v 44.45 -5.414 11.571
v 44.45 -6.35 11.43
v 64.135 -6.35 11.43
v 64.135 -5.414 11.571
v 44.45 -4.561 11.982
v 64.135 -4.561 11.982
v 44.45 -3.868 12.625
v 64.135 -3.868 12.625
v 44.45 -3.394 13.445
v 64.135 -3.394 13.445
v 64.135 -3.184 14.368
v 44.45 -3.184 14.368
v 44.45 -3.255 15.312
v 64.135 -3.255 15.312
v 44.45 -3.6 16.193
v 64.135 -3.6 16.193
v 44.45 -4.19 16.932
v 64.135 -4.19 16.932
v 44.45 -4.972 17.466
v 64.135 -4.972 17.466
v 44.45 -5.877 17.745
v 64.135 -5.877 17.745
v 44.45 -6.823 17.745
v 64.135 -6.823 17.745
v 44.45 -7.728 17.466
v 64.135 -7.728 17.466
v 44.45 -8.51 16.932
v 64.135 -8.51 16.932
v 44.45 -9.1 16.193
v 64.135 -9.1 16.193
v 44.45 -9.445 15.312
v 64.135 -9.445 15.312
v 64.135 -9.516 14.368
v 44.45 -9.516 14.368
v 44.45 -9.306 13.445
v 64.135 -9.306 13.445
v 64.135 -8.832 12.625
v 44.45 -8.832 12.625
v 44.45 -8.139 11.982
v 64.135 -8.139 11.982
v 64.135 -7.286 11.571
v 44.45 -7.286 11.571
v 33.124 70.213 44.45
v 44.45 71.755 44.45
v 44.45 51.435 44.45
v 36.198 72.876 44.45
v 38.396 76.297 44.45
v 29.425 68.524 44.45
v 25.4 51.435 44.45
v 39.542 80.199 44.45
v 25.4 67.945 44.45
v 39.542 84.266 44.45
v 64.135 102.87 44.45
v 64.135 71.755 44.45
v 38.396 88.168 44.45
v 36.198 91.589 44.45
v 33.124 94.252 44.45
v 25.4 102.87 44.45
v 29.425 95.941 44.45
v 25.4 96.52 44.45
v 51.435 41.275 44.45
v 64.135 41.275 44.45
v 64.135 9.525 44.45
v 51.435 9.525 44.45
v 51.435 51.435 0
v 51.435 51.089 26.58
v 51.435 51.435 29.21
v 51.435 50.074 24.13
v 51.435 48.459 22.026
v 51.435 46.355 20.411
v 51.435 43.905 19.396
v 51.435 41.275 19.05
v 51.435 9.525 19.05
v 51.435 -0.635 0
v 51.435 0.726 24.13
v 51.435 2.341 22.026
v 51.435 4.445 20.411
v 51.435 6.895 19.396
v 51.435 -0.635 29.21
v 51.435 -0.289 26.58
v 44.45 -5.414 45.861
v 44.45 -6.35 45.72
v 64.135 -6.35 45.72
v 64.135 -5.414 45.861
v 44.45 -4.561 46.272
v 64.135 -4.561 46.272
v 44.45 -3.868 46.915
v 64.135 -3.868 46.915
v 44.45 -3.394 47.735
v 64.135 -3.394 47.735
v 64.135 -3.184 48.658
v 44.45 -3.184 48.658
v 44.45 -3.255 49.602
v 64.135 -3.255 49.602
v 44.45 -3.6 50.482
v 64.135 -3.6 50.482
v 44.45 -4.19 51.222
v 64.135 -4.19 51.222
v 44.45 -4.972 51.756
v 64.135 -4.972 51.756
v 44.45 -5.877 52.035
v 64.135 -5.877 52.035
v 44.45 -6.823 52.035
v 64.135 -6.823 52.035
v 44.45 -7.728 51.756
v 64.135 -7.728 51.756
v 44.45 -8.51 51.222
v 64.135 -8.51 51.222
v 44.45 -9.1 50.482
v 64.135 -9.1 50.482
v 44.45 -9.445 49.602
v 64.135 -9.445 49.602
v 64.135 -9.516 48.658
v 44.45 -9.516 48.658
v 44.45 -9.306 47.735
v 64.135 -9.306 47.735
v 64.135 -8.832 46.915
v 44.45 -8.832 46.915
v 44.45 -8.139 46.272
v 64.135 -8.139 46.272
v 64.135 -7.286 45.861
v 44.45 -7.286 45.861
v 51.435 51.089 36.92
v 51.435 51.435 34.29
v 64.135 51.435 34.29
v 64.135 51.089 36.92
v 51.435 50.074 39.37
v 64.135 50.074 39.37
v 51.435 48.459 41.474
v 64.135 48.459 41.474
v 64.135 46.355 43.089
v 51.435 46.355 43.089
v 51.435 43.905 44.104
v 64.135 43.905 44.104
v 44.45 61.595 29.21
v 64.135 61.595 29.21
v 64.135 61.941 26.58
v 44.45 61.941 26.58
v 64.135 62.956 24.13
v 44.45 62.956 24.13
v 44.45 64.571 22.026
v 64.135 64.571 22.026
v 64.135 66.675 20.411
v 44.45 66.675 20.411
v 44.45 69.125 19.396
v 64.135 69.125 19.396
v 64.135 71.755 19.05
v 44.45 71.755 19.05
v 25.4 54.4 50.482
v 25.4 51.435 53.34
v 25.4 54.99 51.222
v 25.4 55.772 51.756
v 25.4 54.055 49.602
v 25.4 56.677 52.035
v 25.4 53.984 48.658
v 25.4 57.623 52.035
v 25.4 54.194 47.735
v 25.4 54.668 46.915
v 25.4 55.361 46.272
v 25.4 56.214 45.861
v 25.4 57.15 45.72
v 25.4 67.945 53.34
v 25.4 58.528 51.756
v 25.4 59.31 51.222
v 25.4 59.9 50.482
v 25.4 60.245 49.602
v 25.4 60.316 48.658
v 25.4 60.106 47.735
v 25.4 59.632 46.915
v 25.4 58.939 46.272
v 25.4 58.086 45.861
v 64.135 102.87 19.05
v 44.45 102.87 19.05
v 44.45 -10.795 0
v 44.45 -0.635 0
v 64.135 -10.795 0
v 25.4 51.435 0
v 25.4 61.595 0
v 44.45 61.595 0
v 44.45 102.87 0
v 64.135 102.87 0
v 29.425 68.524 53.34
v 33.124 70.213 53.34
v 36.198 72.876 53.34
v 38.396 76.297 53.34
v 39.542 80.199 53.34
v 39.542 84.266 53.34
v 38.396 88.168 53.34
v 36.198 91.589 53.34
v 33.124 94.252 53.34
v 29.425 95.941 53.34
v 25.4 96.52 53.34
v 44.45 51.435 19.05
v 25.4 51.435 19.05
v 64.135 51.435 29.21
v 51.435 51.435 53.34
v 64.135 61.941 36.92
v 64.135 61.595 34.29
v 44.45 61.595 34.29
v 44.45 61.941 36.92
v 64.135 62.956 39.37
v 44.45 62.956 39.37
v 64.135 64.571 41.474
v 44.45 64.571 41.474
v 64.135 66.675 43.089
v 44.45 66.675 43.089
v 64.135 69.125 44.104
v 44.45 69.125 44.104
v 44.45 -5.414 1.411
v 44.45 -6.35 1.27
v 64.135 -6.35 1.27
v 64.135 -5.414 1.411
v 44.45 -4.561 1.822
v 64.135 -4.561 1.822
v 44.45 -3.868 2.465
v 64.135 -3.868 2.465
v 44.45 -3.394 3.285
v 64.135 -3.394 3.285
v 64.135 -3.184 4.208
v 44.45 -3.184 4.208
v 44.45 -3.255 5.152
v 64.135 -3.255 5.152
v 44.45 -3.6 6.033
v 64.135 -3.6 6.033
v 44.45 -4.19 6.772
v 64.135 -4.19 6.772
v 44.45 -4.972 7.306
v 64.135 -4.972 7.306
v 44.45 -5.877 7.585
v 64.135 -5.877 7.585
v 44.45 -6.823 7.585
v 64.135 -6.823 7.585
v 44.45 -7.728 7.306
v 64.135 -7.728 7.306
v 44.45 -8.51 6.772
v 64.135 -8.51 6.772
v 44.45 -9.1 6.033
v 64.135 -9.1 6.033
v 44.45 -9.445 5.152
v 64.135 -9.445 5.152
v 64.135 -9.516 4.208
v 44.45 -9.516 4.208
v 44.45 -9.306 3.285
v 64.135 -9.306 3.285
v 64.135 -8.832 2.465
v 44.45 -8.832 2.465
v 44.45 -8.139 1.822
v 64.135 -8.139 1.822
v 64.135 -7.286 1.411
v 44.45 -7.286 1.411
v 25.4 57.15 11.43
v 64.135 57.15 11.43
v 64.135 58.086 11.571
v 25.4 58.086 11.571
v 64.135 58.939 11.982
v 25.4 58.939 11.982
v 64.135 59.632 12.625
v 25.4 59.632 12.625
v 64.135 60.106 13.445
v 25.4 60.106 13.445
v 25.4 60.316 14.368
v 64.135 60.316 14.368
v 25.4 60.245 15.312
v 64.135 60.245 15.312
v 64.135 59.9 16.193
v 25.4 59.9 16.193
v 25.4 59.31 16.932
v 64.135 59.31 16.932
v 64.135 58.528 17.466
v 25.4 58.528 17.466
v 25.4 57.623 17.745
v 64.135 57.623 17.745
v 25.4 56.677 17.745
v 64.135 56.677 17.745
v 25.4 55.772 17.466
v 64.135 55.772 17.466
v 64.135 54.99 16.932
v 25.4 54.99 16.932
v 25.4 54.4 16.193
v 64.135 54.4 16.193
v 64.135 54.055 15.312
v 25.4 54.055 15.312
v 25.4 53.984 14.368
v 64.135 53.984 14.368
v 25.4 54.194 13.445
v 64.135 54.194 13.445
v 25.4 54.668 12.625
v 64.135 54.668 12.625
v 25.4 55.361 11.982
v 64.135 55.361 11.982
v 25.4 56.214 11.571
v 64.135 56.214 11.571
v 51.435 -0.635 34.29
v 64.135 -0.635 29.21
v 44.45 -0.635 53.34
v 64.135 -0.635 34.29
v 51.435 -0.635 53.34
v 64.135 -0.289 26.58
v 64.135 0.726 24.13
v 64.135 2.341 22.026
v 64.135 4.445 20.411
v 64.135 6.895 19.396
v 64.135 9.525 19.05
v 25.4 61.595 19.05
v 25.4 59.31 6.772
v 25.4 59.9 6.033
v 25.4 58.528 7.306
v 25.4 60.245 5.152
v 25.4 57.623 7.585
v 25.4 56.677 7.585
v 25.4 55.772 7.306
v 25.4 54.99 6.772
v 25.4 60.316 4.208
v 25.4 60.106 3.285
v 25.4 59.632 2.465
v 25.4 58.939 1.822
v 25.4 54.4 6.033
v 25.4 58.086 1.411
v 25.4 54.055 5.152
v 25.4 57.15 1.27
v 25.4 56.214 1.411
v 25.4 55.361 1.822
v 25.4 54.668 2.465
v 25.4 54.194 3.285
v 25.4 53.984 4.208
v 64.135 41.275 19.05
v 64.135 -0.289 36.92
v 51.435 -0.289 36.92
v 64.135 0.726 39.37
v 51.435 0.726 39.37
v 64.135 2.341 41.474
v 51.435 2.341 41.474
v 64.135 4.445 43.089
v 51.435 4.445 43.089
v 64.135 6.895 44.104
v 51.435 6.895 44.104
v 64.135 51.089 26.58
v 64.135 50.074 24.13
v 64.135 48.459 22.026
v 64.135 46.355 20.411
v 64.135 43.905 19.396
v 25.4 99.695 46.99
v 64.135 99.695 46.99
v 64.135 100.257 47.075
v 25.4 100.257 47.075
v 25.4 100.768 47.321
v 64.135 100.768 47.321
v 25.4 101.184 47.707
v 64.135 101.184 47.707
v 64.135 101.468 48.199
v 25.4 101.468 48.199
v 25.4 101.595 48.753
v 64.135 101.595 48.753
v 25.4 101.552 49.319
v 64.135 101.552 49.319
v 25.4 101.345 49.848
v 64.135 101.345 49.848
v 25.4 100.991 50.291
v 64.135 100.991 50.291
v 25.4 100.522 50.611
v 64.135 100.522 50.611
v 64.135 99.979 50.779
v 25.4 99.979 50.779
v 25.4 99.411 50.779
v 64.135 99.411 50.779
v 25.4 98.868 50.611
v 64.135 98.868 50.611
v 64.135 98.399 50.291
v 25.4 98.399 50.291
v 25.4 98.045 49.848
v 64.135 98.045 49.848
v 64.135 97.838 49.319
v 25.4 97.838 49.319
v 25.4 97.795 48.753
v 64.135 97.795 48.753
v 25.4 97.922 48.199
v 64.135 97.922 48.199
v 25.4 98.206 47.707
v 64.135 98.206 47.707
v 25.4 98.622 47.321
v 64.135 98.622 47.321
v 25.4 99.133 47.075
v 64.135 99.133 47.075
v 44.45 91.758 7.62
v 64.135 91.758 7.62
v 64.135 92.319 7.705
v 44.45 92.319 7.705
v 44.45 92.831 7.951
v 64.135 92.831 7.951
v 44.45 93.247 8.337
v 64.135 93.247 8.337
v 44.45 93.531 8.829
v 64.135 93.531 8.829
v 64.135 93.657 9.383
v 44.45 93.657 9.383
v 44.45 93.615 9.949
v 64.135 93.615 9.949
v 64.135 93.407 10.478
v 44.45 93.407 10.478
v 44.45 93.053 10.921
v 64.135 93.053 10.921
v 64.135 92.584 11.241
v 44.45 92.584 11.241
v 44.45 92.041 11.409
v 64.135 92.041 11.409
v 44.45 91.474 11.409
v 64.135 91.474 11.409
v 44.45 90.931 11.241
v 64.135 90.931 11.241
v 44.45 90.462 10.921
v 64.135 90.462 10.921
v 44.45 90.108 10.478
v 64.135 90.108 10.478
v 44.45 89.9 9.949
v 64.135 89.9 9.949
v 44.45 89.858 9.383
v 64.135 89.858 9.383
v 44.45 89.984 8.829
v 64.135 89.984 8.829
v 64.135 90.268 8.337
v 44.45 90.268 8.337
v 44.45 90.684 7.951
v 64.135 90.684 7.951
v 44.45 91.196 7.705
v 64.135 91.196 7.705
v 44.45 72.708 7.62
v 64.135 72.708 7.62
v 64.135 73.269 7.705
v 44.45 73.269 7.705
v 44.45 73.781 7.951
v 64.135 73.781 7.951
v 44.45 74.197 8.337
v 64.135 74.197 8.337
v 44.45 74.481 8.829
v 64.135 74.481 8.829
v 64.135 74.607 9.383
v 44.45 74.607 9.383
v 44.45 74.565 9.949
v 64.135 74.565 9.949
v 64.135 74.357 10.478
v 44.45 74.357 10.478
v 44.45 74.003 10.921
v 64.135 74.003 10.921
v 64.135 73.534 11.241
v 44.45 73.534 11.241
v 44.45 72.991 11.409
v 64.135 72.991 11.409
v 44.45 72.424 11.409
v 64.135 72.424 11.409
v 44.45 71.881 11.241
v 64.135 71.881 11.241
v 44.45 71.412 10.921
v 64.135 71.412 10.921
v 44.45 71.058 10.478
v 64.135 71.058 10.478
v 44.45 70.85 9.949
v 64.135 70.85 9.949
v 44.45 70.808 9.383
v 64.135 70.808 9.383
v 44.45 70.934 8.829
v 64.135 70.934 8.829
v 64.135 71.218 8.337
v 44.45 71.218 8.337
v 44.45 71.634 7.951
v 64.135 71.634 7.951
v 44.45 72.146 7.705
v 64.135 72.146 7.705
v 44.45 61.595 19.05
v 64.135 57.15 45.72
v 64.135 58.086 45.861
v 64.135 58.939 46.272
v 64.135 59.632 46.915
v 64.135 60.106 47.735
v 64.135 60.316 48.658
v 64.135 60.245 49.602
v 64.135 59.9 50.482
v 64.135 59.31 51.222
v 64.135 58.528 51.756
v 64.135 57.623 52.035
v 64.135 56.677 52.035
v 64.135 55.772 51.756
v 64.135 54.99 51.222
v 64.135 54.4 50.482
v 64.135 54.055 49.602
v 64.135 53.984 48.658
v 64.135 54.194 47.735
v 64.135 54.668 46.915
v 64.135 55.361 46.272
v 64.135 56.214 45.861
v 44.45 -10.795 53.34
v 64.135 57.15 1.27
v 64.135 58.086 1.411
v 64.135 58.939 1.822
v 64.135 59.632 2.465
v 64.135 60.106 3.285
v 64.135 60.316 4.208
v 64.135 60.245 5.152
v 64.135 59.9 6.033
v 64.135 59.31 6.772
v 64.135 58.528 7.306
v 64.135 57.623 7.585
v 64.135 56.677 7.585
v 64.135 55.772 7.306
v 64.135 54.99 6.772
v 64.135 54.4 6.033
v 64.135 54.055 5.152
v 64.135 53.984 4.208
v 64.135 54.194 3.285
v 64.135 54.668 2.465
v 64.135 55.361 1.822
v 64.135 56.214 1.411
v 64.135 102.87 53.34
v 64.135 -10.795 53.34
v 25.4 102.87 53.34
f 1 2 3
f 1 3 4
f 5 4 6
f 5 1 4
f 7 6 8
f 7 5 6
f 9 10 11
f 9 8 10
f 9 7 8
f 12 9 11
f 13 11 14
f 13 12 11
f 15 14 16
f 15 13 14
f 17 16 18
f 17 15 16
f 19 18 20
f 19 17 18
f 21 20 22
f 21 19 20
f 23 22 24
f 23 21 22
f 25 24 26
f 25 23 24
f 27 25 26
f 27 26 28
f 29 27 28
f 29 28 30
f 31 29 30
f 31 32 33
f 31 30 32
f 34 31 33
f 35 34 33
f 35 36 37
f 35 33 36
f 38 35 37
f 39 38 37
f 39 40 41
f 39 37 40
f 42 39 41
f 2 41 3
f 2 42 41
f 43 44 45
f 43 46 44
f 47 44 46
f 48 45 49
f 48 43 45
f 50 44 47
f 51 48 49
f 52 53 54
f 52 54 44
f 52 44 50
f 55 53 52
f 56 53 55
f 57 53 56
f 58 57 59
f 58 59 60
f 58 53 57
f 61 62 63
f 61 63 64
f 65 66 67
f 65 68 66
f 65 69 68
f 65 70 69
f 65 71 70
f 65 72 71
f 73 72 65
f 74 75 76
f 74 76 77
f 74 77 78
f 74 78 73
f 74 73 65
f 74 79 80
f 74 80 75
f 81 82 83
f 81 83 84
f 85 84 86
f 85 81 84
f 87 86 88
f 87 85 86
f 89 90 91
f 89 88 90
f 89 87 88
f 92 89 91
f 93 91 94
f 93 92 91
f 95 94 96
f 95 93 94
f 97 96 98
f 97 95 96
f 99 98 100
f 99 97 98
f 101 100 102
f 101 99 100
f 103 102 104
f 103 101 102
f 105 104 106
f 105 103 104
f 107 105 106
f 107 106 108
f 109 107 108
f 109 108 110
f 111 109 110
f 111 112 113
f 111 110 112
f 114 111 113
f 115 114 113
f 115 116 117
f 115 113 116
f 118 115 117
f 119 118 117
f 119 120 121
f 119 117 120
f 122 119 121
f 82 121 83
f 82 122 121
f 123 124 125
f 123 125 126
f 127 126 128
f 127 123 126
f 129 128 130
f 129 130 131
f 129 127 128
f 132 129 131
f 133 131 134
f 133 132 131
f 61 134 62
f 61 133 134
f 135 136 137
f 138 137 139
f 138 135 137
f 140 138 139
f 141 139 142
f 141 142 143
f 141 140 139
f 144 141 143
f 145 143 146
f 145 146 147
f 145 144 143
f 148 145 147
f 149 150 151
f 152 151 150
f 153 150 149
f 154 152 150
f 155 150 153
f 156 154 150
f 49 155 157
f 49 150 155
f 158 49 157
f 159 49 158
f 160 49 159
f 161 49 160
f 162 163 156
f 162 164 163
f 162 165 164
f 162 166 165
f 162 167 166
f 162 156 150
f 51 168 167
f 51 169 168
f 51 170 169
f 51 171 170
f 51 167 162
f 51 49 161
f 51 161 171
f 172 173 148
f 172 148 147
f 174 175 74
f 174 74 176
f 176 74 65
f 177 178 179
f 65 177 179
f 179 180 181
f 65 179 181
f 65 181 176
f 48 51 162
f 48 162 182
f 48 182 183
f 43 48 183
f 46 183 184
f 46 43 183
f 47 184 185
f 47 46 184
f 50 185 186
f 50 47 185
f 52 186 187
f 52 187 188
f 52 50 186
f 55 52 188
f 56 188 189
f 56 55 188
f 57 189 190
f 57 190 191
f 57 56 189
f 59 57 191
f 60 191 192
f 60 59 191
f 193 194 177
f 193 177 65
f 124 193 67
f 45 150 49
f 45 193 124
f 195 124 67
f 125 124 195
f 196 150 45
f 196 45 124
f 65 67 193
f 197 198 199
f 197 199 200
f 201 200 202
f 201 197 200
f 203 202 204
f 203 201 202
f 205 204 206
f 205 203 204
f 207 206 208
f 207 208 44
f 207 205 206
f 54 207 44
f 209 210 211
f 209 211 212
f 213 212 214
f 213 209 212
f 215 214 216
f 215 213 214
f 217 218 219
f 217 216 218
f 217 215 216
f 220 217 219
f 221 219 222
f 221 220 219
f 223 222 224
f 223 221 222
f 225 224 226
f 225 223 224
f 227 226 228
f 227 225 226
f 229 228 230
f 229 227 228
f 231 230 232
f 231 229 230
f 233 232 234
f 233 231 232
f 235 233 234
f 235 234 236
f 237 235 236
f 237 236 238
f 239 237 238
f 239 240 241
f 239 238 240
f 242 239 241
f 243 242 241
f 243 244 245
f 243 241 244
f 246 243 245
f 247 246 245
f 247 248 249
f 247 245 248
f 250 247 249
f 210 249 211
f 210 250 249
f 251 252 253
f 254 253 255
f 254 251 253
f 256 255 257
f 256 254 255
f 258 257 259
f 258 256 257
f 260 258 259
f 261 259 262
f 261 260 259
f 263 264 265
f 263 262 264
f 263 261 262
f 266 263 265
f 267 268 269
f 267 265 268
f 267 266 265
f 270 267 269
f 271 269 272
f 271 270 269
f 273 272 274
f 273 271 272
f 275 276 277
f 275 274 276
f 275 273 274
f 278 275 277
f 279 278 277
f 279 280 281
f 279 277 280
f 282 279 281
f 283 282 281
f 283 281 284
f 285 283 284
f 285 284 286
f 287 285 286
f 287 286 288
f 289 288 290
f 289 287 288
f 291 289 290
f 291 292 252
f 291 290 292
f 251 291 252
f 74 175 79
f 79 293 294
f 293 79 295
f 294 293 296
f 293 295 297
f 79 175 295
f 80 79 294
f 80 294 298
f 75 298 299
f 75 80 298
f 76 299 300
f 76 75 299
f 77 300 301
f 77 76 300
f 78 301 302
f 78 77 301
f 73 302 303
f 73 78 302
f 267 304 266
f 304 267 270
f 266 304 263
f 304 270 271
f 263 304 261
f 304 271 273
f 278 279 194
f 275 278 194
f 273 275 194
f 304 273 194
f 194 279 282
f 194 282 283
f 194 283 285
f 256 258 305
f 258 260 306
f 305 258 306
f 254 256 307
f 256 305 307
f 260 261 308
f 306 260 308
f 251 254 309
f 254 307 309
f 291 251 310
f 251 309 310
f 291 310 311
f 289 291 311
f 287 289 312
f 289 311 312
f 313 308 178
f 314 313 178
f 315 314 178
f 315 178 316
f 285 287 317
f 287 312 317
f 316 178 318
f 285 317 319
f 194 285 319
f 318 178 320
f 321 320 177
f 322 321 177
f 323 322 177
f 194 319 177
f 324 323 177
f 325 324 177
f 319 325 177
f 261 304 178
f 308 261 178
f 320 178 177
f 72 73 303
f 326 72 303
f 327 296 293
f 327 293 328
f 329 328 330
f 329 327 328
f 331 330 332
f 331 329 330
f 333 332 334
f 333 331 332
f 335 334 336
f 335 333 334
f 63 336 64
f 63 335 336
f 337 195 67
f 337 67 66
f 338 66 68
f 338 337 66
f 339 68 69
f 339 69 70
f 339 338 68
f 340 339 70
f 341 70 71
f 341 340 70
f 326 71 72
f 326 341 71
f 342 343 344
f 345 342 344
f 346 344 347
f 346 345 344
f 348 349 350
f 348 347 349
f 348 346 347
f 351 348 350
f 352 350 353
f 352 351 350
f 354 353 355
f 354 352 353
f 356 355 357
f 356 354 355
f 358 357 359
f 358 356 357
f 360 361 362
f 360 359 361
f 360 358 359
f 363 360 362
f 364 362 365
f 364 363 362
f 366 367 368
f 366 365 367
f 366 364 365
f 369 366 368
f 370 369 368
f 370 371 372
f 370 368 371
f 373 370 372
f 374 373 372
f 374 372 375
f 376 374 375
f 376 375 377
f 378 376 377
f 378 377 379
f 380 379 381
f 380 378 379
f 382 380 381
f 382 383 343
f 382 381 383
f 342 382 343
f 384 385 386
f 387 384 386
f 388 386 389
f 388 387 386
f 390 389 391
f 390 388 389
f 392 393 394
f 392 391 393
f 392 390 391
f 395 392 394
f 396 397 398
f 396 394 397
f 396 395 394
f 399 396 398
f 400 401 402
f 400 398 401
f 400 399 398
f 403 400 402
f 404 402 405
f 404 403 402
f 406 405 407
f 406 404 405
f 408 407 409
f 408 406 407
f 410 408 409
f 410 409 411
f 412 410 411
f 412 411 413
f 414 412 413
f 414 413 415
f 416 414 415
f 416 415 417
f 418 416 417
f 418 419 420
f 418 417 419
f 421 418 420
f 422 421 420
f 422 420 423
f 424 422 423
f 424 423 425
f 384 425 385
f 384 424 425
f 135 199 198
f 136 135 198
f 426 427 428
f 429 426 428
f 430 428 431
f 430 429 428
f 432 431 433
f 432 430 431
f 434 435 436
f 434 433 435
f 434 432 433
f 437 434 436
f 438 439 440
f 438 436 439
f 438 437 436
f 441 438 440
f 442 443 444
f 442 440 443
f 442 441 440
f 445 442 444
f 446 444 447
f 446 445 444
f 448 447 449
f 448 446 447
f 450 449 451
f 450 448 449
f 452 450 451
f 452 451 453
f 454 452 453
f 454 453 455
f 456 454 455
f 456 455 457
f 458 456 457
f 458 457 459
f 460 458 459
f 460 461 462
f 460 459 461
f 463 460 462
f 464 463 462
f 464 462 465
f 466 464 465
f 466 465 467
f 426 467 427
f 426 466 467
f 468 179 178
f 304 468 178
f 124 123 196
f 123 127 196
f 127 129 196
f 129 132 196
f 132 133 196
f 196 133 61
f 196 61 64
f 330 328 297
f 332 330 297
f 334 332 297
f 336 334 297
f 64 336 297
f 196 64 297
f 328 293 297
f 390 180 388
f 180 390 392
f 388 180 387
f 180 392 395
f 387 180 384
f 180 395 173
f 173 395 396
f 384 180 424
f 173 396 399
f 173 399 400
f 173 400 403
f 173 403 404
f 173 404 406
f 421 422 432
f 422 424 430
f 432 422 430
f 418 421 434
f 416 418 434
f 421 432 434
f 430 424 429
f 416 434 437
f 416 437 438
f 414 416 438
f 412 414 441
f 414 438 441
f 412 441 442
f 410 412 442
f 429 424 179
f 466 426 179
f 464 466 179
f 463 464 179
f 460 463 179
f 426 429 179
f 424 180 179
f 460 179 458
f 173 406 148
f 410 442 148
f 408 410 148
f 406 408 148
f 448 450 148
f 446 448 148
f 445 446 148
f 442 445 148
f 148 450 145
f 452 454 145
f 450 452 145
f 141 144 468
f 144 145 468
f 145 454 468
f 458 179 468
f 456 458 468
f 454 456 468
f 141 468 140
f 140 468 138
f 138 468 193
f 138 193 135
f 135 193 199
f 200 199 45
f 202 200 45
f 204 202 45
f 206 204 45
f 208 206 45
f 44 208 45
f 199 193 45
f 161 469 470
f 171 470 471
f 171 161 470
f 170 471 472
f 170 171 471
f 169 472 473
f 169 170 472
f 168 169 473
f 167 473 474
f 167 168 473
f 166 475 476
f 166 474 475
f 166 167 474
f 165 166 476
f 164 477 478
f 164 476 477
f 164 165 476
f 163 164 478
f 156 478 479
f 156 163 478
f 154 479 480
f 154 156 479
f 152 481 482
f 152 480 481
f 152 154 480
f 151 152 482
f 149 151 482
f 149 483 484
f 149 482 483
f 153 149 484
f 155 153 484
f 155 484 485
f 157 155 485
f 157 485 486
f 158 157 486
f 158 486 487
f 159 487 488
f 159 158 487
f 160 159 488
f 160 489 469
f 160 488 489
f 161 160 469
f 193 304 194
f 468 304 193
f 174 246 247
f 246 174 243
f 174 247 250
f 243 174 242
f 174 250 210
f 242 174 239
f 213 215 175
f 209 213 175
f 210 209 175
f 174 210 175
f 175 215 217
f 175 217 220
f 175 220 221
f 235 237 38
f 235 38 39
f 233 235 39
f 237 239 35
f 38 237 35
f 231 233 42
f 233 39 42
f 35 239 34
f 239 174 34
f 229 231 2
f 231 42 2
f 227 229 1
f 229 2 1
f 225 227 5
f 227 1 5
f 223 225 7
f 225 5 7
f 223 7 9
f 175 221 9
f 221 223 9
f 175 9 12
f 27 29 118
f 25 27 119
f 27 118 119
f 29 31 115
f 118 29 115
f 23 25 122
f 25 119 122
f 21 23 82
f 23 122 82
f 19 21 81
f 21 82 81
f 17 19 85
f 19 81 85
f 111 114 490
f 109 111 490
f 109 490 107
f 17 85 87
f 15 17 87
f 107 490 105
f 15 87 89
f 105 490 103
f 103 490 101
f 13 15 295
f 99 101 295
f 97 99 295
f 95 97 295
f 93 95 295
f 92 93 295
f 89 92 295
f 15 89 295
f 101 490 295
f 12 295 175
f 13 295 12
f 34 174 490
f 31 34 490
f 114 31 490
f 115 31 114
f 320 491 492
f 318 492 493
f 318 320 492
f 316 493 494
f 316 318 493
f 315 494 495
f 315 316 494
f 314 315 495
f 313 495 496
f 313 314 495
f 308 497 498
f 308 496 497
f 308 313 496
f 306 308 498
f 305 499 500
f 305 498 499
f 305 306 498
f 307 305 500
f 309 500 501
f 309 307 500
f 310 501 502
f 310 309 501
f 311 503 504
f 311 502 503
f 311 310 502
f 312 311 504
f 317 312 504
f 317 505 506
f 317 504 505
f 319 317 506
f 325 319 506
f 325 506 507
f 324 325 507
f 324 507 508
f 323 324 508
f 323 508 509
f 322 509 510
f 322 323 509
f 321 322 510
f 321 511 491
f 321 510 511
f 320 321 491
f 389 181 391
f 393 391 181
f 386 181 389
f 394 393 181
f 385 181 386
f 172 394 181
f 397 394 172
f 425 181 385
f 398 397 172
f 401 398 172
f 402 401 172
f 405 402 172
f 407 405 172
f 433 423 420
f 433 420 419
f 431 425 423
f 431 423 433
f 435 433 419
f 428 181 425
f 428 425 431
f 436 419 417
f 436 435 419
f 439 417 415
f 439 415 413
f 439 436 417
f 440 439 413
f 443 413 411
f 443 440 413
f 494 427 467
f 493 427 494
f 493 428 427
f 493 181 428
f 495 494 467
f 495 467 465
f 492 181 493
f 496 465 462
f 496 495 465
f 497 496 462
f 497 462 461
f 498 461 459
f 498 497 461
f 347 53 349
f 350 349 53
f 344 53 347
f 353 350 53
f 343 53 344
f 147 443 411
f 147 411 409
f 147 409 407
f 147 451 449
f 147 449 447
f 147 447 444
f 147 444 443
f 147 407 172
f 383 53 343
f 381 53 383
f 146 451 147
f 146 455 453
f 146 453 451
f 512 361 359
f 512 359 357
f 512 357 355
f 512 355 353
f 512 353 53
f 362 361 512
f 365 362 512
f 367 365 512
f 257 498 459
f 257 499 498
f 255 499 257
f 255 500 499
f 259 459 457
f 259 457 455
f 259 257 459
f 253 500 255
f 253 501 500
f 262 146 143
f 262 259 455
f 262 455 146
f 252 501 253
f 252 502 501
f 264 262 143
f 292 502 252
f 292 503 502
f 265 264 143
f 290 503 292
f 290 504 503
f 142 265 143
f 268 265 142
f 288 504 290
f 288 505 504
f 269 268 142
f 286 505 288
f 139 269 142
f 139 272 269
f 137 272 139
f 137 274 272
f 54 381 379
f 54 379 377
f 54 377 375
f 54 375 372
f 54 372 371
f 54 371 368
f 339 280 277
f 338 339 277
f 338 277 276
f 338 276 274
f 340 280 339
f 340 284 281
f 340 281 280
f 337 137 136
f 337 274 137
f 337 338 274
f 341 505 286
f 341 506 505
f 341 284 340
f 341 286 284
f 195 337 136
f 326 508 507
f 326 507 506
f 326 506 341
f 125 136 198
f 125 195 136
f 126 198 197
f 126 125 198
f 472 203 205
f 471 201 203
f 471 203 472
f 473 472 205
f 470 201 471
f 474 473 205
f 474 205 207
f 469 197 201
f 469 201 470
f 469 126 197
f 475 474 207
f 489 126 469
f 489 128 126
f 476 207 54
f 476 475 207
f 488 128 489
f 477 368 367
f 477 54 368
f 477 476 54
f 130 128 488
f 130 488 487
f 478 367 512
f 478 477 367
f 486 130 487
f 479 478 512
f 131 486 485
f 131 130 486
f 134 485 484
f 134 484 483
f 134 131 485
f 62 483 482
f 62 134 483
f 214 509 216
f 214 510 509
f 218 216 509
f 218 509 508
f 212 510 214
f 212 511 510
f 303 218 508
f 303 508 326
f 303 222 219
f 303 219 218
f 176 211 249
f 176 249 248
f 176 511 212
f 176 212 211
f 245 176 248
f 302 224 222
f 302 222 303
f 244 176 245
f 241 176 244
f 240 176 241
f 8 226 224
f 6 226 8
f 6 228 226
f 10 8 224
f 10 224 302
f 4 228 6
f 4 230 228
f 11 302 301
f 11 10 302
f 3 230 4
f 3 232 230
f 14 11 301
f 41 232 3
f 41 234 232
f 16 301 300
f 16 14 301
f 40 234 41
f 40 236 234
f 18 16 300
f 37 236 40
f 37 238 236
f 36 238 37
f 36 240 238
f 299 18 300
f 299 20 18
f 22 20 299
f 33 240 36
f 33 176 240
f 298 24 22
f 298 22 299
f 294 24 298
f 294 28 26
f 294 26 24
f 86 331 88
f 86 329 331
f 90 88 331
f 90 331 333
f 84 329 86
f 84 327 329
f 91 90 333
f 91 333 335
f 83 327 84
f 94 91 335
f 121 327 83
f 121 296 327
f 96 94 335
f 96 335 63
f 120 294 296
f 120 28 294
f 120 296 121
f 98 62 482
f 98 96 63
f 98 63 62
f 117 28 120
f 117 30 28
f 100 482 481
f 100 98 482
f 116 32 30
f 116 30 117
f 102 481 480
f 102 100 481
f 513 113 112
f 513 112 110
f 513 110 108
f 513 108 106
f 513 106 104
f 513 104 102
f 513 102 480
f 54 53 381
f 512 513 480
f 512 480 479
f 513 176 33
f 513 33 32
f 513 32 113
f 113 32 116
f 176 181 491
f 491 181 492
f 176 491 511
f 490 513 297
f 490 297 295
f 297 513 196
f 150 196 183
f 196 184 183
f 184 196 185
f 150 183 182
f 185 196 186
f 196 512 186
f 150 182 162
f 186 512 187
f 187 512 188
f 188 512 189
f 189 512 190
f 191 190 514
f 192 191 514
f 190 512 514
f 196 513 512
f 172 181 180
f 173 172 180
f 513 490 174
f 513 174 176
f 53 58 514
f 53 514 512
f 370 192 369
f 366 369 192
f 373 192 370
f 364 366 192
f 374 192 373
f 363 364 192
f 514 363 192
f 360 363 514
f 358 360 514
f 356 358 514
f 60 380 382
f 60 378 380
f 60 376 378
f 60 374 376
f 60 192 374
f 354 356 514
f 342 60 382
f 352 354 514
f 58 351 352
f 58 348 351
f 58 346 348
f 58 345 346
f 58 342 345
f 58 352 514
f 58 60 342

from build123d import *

# Parameters (mm, degrees)
BOSS_EXTRUDE1_DEPTH     = 19.05
CUT_EXTRUDE1_DEPTH      = 112.559578813
CUT_EXTRUDE1_DEPTH_BACK = 112.559578813
SKETCH2_R               = 1.905
BOSS_EXTRUDE2_START     = 25.4
BOSS_EXTRUDE2_DEPTH     = 8.89
SKETCH5_W               = 19.685
SKETCH5_H               = 10.16
BOSS_EXTRUDE4_DEPTH     = 34.29
CUT_EXTRUDE2_DEPTH      = 123.179346557
CUT_EXTRUDE2_DEPTH_BACK = 123.179346557
SKETCH6_R               = 3.175
CUT_EXTRUDE4_DEPTH      = 123.179346557
CUT_EXTRUDE4_DEPTH_BACK = 123.179346557
SKETCH9_R               = 3.175
FILLET1_R               = 10.16
CUT_EXTRUDE8_DEPTH      = 123.179346557
CUT_EXTRUDE8_DEPTH_BACK = 123.179346557
SKETCH14_R              = 1.905


with BuildPart() as part:
    # Sketch1 → Boss-Extrude1 (new body)
    with BuildSketch(Plane.XY):
        Polygon((44.45, -0.635), (44.45, -10.795), (64.135, -10.795), (64.135, 102.87), (44.45, 102.87), (44.45, 100.33), (44.45, 61.595), (25.4, 61.595), (25.4, 51.435), (51.435, 51.435), (51.435, -0.635), align=None)
    extrude(amount=BOSS_EXTRUDE1_DEPTH)

    # Sketch2 → Cut-Extrude1 (cut, two sides: drawn at the far end of the back side and taken through both)
    with BuildSketch(Plane(origin=(64.135, 0, 0), x_dir=(0, 0, -1), z_dir=(1, 0, 0)).offset(-CUT_EXTRUDE1_DEPTH_BACK)):
        with Locations((-9.525, 91.7575)):
            Circle(SKETCH2_R)
        with Locations((-9.525, 72.7075)):
            Circle(SKETCH2_R)
    extrude(amount=CUT_EXTRUDE1_DEPTH + CUT_EXTRUDE1_DEPTH_BACK, mode=Mode.SUBTRACT)



with BuildPart() as body_2:
    # Sketch3 → Boss-Extrude2 (new body)
    with BuildSketch(Plane.XY.offset(19.05).offset(BOSS_EXTRUDE2_START)):
        with BuildLine():
            Line((25.4, 96.52), (25.4, 102.87))
            Line((25.4, 102.87), (44.45, 102.87))
            Line((44.45, 102.87), (64.135, 102.87))
            Line((64.135, 102.87), (64.135, -10.795))
            Line((64.135, -10.795), (44.45, -10.795))
            Line((44.45, -10.795), (44.45, -0.635))
            Line((44.45, -0.635), (51.435, -0.635))
            Line((51.435, -0.635), (51.435, 51.435))
            Line((51.435, 51.435), (25.4, 51.435))
            Line((25.4, 51.435), (25.4, 61.595))
            Line((25.4, 61.595), (25.4, 67.945))
            ThreePointArc((25.4, 67.945), (39.6875, 82.2325), (25.4, 96.52))
        make_face()
    extrude(amount=BOSS_EXTRUDE2_DEPTH)


with BuildPart() as part_1:
    add(part.part)

    add(body_2.part)  # Boss-Extrude4 merges body 2
    # Sketch5 → Boss-Extrude4 (add)
    with BuildSketch(Plane.XY.offset(53.34)):
        with Locations((54.2925, -5.715)):
            Rectangle(SKETCH5_W, SKETCH5_H)
        with Locations((54.2925, 56.515)):
            Rectangle(SKETCH5_W, SKETCH5_H)
    extrude(amount=-BOSS_EXTRUDE4_DEPTH)

    # Sketch6 → Cut-Extrude2 (cut, two sides: drawn at the far end of the back side and taken through both)
    with BuildSketch(Plane(origin=(64.135, 0, 0), x_dir=(0, 0, -1), z_dir=(1, 0, 0)).offset(-CUT_EXTRUDE2_DEPTH_BACK)):
        with Locations((-14.605, 57.15)):
            Circle(SKETCH6_R)
        with Locations((-4.445, 57.15)):
            Circle(SKETCH6_R)
        with Locations((-14.605, -6.35)):
            Circle(SKETCH6_R)
        with Locations((-4.445, -6.35)):
            Circle(SKETCH6_R)
    extrude(amount=CUT_EXTRUDE2_DEPTH + CUT_EXTRUDE2_DEPTH_BACK, mode=Mode.SUBTRACT)

    # Sketch9 → Cut-Extrude4 (cut, two sides: drawn at the far end of the back side and taken through both)
    with BuildSketch(Plane(origin=(64.135, 0, 0), x_dir=(0, 0, -1), z_dir=(1, 0, 0)).offset(-CUT_EXTRUDE4_DEPTH_BACK)):
        with Locations((-48.895, 57.15)):
            Circle(SKETCH9_R)
        with Locations((-48.895, -6.35)):
            Circle(SKETCH9_R)
    extrude(amount=CUT_EXTRUDE4_DEPTH + CUT_EXTRUDE4_DEPTH_BACK, mode=Mode.SUBTRACT)

    # Fillet1
    # the kernel refuses this fillet: 10.16 mm, written as the material it adds along each edge
    with BuildSketch(Plane(origin=(44.45, 61.595, 19.05), x_dir=(0, 1, 0), z_dir=(1, 0, 0))) as fillet1_piece_1:
        with BuildLine():
            CenterArc((FILLET1_R, FILLET1_R), FILLET1_R, 180, 90)
            Line((0, FILLET1_R), (0, 0))
            Line((0, 0), (FILLET1_R, 0))
        make_face()
    extrude(amount=19.685)
    with BuildSketch(Plane(origin=(64.135, 51.435, 19.05), x_dir=(0, -1, 0), z_dir=(-1, 0, 0)), Plane(origin=(51.435, 51.435, 44.45), x_dir=(0, -1, 0), z_dir=(1, 0, 0))) as fillet1_piece_2:
        with BuildLine():
            CenterArc((FILLET1_R, FILLET1_R), FILLET1_R, 180, 90)
            Line((0, FILLET1_R), (0, 0))
            Line((0, 0), (FILLET1_R, 0))
        make_face()
    extrude(amount=12.7)
    with BuildSketch(Plane(origin=(64.135, 61.595, 44.45), x_dir=(0, 0, -1), z_dir=(-1, 0, 0))) as fillet1_piece_3:
        with BuildLine():
            CenterArc((FILLET1_R, -FILLET1_R), FILLET1_R, 90, 90)
            Line((0, -FILLET1_R), (0, 0))
            Line((0, 0), (FILLET1_R, 0))
        make_face()
    extrude(amount=19.685)
    with BuildSketch(Plane(origin=(64.135, -0.635, 44.45), x_dir=(0, 0, -1), z_dir=(-1, 0, 0)), Plane(origin=(51.435, -0.635, 19.05), x_dir=(0, 0, 1), z_dir=(1, 0, 0))) as fillet1_piece_4:
        with BuildLine():
            CenterArc((FILLET1_R, -FILLET1_R), FILLET1_R, 90, 90)
            Line((0, -FILLET1_R), (0, 0))
            Line((0, 0), (FILLET1_R, 0))
        make_face()
    extrude(amount=12.7)

    # Sketch14 → Cut-Extrude8 (cut, two sides: drawn at the far end of the back side and taken through both)
    with BuildSketch(Plane(origin=(64.135, 0, 0), x_dir=(0, 0, -1), z_dir=(1, 0, 0)).offset(-CUT_EXTRUDE8_DEPTH_BACK)):
        with Locations((-48.895, 99.695)):
            Circle(SKETCH14_R)
    extrude(amount=CUT_EXTRUDE8_DEPTH + CUT_EXTRUDE8_DEPTH_BACK, mode=Mode.SUBTRACT)


solid = part_1.part
